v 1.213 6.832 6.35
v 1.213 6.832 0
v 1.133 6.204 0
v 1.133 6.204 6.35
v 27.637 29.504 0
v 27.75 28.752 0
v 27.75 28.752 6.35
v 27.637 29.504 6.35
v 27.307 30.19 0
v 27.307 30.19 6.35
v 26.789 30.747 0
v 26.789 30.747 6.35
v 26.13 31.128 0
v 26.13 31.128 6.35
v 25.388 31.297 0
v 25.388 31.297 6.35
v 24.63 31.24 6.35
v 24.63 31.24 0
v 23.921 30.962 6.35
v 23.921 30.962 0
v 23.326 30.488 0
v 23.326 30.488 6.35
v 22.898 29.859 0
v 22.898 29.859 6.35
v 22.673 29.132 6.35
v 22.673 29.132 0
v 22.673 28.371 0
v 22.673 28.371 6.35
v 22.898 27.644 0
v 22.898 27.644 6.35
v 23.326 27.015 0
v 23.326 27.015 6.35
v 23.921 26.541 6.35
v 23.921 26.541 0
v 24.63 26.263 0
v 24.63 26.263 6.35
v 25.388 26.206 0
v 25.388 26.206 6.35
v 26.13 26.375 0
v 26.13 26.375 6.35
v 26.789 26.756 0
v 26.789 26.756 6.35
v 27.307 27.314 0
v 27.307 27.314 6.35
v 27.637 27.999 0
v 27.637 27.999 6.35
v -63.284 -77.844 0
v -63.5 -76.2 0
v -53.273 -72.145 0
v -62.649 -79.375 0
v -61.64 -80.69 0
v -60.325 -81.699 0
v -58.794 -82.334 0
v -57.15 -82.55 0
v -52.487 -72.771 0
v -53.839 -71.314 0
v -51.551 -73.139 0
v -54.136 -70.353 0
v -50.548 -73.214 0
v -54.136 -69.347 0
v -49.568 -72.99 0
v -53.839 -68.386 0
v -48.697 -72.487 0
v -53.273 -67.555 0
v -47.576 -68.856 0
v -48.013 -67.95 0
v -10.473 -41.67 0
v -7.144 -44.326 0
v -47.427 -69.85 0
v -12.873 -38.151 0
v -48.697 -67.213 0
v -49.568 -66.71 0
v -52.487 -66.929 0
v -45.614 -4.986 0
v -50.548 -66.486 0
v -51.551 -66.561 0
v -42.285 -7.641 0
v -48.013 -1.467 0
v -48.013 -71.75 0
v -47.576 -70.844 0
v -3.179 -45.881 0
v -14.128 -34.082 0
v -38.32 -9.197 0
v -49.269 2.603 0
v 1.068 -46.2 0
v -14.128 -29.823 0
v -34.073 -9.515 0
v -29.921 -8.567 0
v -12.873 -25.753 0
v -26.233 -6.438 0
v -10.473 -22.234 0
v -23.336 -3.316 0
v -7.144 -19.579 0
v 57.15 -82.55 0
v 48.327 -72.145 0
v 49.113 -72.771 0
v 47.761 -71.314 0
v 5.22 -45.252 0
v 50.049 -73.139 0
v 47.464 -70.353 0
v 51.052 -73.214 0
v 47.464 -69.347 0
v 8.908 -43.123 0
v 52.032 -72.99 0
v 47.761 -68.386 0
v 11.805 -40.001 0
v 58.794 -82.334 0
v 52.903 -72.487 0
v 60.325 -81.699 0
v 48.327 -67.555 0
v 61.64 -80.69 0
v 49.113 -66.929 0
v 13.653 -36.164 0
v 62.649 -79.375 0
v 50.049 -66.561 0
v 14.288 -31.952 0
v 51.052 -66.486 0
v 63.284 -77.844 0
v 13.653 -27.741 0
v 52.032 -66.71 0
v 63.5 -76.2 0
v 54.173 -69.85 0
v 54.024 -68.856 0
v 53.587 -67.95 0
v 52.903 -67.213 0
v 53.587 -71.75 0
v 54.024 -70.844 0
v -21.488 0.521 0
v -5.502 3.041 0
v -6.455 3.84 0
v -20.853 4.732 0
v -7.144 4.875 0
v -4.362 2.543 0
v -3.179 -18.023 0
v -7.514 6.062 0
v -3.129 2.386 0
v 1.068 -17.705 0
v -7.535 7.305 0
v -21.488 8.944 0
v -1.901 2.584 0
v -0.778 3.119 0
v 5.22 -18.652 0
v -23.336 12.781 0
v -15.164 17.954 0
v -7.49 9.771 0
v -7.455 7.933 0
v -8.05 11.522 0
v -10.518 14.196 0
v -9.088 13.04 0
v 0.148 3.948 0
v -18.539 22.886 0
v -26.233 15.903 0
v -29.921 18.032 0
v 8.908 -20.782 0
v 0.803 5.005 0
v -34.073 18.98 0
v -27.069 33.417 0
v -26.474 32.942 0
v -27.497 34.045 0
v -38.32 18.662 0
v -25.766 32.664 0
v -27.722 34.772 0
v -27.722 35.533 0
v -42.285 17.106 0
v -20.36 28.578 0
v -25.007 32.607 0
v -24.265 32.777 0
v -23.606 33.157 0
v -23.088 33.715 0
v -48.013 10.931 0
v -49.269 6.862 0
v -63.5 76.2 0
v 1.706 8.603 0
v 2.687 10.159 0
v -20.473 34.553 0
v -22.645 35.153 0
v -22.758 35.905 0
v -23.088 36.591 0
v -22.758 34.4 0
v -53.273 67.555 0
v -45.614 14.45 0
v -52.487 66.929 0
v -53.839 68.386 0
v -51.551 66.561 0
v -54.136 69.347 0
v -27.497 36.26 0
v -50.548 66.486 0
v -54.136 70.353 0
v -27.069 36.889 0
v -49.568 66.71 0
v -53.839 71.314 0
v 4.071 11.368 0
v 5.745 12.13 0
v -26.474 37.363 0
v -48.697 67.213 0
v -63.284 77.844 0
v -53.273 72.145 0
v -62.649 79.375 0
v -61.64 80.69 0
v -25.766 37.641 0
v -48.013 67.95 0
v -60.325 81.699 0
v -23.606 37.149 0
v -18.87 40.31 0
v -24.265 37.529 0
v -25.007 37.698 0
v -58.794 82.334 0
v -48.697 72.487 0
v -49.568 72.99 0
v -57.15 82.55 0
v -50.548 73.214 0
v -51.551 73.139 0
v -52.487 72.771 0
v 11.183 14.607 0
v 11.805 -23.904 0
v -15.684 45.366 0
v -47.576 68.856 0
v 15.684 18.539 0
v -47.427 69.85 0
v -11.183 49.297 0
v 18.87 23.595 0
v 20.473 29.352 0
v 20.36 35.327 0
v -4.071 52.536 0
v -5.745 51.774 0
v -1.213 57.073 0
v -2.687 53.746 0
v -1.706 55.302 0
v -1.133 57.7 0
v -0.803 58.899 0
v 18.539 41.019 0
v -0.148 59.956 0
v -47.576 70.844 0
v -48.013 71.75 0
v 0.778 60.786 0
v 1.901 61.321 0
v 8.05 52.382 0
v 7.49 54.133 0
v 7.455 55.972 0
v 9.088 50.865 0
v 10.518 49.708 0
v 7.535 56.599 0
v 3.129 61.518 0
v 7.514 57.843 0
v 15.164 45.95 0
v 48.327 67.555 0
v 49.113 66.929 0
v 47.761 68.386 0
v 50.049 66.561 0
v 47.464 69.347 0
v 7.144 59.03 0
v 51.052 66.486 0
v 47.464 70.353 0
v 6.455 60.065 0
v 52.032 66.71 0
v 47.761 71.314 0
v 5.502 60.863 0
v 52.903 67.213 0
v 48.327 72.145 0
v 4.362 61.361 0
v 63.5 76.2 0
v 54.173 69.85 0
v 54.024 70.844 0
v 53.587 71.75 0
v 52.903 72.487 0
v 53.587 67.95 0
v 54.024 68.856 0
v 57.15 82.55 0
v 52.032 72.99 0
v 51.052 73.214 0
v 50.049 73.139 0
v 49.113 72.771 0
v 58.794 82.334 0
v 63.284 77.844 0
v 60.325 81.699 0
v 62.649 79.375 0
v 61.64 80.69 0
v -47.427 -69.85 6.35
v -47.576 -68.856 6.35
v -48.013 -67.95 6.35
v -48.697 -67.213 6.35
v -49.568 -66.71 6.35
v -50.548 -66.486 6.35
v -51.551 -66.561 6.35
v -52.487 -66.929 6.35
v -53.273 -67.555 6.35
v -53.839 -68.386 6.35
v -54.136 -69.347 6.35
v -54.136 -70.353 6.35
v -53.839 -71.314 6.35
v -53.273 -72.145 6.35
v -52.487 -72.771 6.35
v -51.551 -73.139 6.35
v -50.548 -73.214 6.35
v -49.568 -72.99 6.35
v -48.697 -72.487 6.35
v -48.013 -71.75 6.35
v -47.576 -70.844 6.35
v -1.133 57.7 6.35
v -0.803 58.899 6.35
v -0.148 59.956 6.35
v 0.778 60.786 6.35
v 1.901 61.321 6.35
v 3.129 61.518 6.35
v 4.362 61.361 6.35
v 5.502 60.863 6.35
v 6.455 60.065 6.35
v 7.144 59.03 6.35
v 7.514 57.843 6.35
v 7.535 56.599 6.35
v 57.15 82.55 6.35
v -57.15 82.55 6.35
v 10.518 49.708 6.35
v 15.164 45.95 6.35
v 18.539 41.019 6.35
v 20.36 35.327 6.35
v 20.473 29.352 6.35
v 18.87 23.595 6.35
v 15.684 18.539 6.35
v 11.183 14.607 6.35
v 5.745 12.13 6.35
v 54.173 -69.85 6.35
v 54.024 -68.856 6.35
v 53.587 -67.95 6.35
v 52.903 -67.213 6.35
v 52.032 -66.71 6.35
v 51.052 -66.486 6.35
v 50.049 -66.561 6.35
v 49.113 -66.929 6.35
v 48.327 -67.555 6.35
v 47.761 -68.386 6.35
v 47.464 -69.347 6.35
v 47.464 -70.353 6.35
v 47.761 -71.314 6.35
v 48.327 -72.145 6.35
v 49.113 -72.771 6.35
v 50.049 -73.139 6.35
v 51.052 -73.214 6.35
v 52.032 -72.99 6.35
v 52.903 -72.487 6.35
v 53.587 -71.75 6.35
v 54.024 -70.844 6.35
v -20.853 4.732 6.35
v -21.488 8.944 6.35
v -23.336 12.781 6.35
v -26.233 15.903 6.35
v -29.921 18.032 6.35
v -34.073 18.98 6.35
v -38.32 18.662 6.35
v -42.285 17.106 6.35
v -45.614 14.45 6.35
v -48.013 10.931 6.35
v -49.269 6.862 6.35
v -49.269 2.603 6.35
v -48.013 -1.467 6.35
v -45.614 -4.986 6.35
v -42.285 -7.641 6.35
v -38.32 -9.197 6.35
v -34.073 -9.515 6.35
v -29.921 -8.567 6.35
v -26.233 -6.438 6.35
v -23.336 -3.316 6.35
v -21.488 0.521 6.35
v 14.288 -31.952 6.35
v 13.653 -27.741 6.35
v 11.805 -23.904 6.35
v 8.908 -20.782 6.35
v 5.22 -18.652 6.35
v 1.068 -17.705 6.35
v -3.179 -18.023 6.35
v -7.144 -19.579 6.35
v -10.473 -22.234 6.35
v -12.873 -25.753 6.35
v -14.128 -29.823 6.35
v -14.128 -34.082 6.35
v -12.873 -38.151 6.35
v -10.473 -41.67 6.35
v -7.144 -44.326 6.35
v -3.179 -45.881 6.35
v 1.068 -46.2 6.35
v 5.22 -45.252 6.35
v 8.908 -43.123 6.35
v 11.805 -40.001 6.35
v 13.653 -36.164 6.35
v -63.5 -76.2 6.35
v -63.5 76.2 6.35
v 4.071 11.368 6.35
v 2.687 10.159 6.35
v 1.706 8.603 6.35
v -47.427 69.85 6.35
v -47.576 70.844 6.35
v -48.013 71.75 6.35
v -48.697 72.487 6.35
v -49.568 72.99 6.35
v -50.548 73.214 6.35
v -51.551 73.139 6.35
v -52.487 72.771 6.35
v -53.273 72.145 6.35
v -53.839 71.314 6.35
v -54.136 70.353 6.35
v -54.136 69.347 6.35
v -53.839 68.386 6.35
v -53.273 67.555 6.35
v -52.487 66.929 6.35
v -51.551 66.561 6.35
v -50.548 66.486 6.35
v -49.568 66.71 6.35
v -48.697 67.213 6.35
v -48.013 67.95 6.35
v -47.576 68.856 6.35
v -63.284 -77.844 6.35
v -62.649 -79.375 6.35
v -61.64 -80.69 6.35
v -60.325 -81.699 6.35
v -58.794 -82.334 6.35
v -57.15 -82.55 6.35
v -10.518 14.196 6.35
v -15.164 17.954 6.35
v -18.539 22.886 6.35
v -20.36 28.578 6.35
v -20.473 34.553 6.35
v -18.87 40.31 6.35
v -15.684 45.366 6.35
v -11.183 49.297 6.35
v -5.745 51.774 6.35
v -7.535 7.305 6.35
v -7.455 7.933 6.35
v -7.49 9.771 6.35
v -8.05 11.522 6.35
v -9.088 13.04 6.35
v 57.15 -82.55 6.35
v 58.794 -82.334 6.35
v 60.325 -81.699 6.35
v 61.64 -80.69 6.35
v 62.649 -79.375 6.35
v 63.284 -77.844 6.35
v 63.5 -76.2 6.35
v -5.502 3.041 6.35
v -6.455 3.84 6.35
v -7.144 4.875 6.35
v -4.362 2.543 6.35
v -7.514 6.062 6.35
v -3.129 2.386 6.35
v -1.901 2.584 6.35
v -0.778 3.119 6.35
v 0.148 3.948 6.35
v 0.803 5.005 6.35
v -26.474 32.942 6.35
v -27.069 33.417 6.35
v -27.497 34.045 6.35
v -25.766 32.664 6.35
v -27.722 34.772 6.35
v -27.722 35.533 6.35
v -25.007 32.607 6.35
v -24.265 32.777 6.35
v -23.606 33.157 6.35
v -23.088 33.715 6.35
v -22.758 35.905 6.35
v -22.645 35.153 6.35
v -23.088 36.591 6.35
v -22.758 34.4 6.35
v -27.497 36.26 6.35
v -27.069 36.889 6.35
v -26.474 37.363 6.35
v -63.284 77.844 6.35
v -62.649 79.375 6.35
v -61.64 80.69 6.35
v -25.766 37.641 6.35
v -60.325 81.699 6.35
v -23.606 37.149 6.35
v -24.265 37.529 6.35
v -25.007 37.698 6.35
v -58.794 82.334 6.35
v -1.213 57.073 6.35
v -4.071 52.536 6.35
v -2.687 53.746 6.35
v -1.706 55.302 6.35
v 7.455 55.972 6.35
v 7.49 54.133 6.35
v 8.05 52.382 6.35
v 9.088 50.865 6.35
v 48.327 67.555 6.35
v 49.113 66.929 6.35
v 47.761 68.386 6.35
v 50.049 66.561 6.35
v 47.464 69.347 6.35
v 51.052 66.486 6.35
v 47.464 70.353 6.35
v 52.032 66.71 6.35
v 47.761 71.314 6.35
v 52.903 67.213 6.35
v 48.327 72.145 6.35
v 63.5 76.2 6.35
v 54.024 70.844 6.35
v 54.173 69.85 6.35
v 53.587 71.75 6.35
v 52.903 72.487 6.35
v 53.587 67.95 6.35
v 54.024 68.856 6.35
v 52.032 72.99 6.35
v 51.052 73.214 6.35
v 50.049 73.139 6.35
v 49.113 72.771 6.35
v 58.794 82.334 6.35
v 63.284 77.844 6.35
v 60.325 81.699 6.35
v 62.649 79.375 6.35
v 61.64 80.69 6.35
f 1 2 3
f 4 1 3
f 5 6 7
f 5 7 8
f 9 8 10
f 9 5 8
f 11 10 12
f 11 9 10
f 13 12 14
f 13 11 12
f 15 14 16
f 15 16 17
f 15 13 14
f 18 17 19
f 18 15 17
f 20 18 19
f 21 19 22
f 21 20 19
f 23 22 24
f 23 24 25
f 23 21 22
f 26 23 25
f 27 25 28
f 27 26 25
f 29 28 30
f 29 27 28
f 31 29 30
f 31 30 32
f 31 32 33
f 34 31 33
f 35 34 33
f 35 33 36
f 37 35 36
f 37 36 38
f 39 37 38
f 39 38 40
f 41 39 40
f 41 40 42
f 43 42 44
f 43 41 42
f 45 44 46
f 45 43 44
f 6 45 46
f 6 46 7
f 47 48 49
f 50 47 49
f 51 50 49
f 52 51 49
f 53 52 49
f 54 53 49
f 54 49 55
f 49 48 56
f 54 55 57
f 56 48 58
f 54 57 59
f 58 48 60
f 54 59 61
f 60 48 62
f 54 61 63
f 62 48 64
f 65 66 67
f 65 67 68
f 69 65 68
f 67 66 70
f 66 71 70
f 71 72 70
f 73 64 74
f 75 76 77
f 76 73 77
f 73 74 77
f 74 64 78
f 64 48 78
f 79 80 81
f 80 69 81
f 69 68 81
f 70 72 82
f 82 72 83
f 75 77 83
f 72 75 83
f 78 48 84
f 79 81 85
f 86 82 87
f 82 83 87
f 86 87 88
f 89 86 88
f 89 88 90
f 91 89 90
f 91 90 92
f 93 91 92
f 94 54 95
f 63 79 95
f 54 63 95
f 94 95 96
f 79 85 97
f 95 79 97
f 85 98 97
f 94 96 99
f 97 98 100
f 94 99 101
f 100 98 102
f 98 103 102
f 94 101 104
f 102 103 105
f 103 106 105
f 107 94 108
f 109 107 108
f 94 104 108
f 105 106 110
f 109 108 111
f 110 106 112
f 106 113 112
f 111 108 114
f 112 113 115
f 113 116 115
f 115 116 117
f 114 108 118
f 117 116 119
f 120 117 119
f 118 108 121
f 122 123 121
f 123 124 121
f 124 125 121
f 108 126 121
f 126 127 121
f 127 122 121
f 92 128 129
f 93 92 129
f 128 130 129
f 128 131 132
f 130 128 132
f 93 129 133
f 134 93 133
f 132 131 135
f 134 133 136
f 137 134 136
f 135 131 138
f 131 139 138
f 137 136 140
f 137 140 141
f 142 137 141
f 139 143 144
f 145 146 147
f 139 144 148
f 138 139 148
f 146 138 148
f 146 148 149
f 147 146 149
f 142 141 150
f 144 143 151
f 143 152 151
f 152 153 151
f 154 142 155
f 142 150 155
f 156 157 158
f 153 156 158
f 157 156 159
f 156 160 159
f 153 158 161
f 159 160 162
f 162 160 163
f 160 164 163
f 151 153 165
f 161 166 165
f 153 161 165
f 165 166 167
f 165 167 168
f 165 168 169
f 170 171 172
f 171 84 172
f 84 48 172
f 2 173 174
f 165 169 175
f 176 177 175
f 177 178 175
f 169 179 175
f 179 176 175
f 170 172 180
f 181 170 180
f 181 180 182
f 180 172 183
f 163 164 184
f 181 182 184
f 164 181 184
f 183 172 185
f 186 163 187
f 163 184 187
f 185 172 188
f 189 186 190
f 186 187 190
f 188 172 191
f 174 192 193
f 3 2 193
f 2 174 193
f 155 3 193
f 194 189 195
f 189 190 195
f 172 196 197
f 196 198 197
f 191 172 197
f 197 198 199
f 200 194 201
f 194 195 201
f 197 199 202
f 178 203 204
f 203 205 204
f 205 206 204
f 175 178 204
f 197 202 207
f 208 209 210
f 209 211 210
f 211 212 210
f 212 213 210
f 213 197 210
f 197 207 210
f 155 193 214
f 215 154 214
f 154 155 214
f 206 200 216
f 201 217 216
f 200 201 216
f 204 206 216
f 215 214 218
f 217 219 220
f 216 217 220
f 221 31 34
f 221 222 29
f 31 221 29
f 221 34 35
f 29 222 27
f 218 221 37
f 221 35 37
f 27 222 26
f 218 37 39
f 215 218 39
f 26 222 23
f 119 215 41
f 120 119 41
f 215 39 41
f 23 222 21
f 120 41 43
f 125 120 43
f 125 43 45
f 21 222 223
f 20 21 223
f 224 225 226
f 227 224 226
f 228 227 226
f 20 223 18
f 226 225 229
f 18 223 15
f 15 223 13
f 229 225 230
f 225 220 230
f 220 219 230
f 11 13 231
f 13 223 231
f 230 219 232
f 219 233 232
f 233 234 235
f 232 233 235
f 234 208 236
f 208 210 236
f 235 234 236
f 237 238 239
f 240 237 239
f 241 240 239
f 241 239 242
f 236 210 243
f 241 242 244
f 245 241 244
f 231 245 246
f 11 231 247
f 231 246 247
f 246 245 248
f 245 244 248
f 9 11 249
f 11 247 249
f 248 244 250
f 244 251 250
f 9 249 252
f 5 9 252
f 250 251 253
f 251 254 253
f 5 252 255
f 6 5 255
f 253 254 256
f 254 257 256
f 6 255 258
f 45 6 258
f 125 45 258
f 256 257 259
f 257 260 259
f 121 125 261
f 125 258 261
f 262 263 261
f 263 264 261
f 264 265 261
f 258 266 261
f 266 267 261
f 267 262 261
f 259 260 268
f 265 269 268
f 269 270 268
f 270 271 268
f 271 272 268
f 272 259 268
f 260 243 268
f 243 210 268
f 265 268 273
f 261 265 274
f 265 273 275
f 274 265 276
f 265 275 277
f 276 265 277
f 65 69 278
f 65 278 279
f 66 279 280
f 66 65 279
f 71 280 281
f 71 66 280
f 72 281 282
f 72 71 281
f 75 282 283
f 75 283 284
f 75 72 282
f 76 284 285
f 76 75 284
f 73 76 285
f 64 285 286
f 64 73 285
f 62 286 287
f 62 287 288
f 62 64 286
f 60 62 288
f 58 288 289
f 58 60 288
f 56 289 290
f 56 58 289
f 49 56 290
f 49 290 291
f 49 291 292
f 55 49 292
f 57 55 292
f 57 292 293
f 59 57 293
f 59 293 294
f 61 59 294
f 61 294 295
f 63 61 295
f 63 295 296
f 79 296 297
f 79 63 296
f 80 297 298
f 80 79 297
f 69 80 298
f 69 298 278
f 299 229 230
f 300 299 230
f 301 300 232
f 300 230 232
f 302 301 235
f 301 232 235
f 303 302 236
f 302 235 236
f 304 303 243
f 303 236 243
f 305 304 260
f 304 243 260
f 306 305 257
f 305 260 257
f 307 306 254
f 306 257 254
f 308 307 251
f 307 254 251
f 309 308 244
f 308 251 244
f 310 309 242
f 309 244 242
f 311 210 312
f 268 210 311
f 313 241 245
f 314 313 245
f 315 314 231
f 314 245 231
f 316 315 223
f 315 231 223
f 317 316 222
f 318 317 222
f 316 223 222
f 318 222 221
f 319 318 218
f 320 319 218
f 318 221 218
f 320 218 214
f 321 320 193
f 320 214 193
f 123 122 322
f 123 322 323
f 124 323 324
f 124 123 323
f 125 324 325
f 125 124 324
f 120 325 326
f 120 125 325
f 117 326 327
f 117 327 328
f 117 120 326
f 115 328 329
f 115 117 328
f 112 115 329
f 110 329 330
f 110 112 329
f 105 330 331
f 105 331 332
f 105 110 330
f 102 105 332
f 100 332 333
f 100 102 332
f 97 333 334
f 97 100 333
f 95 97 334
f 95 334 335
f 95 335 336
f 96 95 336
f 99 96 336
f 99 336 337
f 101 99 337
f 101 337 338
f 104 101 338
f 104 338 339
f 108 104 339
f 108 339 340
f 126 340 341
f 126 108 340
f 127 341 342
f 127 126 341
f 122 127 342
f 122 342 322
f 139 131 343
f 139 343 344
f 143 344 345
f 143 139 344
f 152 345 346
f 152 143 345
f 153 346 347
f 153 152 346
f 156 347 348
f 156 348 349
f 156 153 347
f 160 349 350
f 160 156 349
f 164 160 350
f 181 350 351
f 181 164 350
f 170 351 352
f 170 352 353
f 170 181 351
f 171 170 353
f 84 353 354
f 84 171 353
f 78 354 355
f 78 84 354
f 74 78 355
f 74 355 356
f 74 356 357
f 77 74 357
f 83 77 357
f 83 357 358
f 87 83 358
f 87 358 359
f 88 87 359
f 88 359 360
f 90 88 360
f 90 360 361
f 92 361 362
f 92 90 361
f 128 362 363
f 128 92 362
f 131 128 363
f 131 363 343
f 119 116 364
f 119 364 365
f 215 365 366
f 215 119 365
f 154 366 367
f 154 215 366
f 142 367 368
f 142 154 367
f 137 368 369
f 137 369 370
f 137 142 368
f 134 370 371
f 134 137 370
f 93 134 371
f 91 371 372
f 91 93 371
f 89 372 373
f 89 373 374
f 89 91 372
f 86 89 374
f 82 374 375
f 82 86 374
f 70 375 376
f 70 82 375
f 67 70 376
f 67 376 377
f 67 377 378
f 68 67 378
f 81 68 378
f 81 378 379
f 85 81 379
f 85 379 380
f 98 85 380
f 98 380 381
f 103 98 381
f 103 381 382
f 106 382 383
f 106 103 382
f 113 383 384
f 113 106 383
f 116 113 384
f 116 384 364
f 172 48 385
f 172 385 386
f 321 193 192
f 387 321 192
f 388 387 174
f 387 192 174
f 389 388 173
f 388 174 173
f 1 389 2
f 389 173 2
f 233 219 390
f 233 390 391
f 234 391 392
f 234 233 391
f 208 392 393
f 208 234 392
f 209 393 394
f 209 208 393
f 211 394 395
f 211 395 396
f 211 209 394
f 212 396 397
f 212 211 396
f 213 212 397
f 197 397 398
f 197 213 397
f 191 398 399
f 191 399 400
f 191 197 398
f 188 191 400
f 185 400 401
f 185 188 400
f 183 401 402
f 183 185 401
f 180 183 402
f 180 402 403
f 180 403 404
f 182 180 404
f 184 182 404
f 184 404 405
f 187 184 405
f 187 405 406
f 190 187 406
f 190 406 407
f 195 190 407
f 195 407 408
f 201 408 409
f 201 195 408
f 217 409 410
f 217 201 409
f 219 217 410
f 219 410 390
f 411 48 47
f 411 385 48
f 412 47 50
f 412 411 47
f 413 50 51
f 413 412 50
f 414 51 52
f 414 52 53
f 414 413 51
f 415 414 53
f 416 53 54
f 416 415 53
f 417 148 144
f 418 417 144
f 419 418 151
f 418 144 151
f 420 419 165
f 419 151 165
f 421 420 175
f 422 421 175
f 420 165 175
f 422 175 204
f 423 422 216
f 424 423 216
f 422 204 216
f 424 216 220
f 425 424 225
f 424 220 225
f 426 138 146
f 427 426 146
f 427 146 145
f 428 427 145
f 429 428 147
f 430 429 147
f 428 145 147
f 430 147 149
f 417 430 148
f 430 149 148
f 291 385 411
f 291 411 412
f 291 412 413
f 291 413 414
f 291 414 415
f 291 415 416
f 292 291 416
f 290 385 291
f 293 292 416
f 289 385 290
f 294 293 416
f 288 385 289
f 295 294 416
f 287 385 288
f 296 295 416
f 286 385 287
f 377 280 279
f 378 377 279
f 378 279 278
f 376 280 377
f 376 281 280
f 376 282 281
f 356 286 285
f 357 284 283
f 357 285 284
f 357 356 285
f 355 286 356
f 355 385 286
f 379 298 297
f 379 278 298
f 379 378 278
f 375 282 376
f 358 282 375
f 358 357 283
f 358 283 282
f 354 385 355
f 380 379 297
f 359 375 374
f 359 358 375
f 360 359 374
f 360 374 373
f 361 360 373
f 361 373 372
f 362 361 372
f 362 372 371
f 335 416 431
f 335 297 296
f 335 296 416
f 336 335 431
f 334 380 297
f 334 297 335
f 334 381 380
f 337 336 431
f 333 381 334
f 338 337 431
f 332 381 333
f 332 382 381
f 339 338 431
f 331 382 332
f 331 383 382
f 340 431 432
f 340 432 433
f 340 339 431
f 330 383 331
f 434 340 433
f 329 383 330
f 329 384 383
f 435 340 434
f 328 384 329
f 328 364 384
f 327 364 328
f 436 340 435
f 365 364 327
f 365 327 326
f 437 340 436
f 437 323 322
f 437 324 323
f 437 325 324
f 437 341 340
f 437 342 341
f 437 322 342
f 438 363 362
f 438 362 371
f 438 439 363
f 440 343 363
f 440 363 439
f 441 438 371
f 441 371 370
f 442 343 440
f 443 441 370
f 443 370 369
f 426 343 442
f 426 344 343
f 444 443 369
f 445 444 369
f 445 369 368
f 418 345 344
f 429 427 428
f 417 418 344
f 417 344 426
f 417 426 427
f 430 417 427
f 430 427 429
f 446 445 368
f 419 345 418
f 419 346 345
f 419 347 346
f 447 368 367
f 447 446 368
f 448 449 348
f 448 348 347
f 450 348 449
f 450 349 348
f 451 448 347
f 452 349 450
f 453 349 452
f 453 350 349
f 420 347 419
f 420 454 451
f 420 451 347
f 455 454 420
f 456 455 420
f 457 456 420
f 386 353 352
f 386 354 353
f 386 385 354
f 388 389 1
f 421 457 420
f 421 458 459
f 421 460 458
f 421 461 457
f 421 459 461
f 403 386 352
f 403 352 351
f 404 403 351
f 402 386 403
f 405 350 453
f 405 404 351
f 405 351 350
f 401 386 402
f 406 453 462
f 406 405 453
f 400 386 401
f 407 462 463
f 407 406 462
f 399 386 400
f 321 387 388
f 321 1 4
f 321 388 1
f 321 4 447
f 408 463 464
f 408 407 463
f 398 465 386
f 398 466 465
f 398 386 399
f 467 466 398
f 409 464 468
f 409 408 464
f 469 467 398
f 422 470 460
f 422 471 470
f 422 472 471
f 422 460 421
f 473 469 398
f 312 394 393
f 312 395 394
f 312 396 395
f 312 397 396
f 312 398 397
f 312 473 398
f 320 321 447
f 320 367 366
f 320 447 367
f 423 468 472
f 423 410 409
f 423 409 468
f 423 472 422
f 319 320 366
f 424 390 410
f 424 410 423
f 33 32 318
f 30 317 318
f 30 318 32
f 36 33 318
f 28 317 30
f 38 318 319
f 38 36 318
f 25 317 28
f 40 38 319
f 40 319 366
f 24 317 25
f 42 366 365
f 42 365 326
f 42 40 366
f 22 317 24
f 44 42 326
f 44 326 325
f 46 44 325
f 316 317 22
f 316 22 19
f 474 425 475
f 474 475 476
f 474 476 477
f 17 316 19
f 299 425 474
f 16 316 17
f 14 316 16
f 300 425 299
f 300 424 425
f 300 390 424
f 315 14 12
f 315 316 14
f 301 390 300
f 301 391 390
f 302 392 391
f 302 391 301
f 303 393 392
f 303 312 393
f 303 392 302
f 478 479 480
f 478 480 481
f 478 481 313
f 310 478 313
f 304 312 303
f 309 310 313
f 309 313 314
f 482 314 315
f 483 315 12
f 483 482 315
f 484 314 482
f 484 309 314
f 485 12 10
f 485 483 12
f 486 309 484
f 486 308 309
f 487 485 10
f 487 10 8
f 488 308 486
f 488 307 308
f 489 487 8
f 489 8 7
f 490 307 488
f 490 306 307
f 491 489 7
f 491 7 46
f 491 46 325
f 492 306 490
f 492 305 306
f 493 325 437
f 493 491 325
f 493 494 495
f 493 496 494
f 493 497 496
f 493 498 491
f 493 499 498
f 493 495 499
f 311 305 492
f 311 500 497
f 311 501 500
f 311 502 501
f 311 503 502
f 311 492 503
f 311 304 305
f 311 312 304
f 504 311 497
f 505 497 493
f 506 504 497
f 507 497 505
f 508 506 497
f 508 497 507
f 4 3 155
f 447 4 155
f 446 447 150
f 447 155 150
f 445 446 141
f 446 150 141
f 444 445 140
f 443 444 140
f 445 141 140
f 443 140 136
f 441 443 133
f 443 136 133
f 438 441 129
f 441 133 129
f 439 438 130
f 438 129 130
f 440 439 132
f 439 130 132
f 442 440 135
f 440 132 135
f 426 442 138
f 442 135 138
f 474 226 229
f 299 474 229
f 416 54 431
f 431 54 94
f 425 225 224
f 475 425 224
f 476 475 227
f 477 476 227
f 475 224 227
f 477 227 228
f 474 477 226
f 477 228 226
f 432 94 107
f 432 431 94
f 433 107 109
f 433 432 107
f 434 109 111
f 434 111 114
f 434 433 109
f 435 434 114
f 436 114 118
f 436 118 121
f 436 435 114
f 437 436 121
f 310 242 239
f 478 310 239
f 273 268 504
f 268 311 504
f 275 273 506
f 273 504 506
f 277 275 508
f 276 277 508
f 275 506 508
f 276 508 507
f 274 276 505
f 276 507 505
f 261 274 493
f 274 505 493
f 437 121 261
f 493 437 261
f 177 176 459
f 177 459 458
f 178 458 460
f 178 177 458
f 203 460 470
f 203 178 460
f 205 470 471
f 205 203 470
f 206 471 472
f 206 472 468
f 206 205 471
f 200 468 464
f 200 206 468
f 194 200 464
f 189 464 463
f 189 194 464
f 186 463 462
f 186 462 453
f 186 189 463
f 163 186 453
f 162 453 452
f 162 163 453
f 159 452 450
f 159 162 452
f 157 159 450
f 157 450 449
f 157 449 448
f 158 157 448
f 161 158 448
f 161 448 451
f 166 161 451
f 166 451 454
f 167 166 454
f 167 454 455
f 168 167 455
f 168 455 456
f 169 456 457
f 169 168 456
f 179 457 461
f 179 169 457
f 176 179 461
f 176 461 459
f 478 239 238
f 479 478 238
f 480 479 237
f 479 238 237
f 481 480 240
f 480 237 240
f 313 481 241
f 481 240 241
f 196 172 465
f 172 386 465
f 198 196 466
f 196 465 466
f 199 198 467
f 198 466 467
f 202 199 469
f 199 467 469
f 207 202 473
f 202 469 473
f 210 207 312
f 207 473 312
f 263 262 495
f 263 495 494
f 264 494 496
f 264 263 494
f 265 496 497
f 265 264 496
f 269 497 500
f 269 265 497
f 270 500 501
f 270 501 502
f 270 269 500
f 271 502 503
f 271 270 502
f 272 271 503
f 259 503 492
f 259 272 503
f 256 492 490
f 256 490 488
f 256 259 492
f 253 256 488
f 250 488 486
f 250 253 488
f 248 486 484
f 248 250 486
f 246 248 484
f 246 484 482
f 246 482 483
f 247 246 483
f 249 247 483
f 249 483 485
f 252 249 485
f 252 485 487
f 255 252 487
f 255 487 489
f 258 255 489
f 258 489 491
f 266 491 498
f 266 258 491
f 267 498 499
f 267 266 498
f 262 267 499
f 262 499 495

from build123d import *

# Parameters (mm, degrees)
SKETCH1_W           = 127
SKETCH1_H           = 165.1
SKETCH1_R           = 3.3734375
SKETCH1_R_2         = 14.2875
SKETCH1_R_3         = 2.5527
BOSS_EXTRUDE1_DEPTH = 6.35
FILLET1_R           = 6.35


with BuildPart() as part:
    # Sketch1 → Boss-Extrude1 (new body)
    with BuildSketch(Plane.XY):
        Rectangle(SKETCH1_W, SKETCH1_H)
        with Locations((-50.8, 69.85)):
            Circle(SKETCH1_R, mode=Mode.SUBTRACT)
        with Locations((50.8, 69.85)):
            Circle(SKETCH1_R, mode=Mode.SUBTRACT)
        with Locations((50.8, -69.85)):
            Circle(SKETCH1_R, mode=Mode.SUBTRACT)
        with Locations((-50.8, -69.85)):
            Circle(SKETCH1_R, mode=Mode.SUBTRACT)
        with Locations((0, -31.952201006)):
            Circle(SKETCH1_R_2, mode=Mode.SUBTRACT)
        with Locations((-35.1409, 4.732361785)):
            Circle(SKETCH1_R_2, mode=Mode.SUBTRACT)
        with Locations((25.197543761, 28.751609125)):
            Circle(SKETCH1_R_3, mode=Mode.SUBTRACT)
        with Locations((-25.197543761, 35.152792887)):
            Circle(SKETCH1_R_3, mode=Mode.SUBTRACT)
        with BuildLine():
            Line((-7.534569408, 7.305159048), (-7.454878346, 7.932548946))
            ThreePointArc((-7.454878346, 7.932548946), (-8.049848215, 11.522345151), (-10.517966807, 14.196109643))
            ThreePointArc((-10.517966807, 14.196109643), (-20.473004306, 34.552681909), (-5.744824378, 51.773992023))
            ThreePointArc((-5.744824378, 51.773992023), (-2.686624737, 53.7458036), (-1.213076708, 57.072856673))
            Line((-1.213076708, 57.072856673), (-1.133385646, 57.700246571))
            ThreePointArc((-1.133385646, 57.700246571), (3.751093684, 61.483722294), (7.534569408, 56.599242964))
            Line((7.534569408, 56.599242964), (7.454878346, 55.971853066))
            ThreePointArc((7.454878346, 55.971853066), (8.049848215, 52.38205686), (10.517966807, 49.708292369))
            ThreePointArc((10.517966807, 49.708292369), (20.473004306, 29.351720103), (5.744824378, 12.130409989))
            ThreePointArc((5.744824378, 12.130409989), (2.686624737, 10.158598412), (1.213076708, 6.831545339))
            Line((1.213076708, 6.831545339), (1.133385646, 6.204155441))
            ThreePointArc((1.133385646, 6.204155441), (-3.751093684, 2.420679717), (-7.534569408, 7.305159048))
        make_face(mode=Mode.SUBTRACT)
    extrude(amount=BOSS_EXTRUDE1_DEPTH)

    # Fillet1
    fillet1_edges = [part.edges().sort_by_distance(p)[0] for p in [
        (63.5, -82.55, 3.175),
        (-63.5, -82.55, 3.175),
        (-63.5, 82.55, 3.175),
        (63.5, 82.55, 3.175),
    ]]
    fillet(fillet1_edges, radius=FILLET1_R)


solid = part.part
